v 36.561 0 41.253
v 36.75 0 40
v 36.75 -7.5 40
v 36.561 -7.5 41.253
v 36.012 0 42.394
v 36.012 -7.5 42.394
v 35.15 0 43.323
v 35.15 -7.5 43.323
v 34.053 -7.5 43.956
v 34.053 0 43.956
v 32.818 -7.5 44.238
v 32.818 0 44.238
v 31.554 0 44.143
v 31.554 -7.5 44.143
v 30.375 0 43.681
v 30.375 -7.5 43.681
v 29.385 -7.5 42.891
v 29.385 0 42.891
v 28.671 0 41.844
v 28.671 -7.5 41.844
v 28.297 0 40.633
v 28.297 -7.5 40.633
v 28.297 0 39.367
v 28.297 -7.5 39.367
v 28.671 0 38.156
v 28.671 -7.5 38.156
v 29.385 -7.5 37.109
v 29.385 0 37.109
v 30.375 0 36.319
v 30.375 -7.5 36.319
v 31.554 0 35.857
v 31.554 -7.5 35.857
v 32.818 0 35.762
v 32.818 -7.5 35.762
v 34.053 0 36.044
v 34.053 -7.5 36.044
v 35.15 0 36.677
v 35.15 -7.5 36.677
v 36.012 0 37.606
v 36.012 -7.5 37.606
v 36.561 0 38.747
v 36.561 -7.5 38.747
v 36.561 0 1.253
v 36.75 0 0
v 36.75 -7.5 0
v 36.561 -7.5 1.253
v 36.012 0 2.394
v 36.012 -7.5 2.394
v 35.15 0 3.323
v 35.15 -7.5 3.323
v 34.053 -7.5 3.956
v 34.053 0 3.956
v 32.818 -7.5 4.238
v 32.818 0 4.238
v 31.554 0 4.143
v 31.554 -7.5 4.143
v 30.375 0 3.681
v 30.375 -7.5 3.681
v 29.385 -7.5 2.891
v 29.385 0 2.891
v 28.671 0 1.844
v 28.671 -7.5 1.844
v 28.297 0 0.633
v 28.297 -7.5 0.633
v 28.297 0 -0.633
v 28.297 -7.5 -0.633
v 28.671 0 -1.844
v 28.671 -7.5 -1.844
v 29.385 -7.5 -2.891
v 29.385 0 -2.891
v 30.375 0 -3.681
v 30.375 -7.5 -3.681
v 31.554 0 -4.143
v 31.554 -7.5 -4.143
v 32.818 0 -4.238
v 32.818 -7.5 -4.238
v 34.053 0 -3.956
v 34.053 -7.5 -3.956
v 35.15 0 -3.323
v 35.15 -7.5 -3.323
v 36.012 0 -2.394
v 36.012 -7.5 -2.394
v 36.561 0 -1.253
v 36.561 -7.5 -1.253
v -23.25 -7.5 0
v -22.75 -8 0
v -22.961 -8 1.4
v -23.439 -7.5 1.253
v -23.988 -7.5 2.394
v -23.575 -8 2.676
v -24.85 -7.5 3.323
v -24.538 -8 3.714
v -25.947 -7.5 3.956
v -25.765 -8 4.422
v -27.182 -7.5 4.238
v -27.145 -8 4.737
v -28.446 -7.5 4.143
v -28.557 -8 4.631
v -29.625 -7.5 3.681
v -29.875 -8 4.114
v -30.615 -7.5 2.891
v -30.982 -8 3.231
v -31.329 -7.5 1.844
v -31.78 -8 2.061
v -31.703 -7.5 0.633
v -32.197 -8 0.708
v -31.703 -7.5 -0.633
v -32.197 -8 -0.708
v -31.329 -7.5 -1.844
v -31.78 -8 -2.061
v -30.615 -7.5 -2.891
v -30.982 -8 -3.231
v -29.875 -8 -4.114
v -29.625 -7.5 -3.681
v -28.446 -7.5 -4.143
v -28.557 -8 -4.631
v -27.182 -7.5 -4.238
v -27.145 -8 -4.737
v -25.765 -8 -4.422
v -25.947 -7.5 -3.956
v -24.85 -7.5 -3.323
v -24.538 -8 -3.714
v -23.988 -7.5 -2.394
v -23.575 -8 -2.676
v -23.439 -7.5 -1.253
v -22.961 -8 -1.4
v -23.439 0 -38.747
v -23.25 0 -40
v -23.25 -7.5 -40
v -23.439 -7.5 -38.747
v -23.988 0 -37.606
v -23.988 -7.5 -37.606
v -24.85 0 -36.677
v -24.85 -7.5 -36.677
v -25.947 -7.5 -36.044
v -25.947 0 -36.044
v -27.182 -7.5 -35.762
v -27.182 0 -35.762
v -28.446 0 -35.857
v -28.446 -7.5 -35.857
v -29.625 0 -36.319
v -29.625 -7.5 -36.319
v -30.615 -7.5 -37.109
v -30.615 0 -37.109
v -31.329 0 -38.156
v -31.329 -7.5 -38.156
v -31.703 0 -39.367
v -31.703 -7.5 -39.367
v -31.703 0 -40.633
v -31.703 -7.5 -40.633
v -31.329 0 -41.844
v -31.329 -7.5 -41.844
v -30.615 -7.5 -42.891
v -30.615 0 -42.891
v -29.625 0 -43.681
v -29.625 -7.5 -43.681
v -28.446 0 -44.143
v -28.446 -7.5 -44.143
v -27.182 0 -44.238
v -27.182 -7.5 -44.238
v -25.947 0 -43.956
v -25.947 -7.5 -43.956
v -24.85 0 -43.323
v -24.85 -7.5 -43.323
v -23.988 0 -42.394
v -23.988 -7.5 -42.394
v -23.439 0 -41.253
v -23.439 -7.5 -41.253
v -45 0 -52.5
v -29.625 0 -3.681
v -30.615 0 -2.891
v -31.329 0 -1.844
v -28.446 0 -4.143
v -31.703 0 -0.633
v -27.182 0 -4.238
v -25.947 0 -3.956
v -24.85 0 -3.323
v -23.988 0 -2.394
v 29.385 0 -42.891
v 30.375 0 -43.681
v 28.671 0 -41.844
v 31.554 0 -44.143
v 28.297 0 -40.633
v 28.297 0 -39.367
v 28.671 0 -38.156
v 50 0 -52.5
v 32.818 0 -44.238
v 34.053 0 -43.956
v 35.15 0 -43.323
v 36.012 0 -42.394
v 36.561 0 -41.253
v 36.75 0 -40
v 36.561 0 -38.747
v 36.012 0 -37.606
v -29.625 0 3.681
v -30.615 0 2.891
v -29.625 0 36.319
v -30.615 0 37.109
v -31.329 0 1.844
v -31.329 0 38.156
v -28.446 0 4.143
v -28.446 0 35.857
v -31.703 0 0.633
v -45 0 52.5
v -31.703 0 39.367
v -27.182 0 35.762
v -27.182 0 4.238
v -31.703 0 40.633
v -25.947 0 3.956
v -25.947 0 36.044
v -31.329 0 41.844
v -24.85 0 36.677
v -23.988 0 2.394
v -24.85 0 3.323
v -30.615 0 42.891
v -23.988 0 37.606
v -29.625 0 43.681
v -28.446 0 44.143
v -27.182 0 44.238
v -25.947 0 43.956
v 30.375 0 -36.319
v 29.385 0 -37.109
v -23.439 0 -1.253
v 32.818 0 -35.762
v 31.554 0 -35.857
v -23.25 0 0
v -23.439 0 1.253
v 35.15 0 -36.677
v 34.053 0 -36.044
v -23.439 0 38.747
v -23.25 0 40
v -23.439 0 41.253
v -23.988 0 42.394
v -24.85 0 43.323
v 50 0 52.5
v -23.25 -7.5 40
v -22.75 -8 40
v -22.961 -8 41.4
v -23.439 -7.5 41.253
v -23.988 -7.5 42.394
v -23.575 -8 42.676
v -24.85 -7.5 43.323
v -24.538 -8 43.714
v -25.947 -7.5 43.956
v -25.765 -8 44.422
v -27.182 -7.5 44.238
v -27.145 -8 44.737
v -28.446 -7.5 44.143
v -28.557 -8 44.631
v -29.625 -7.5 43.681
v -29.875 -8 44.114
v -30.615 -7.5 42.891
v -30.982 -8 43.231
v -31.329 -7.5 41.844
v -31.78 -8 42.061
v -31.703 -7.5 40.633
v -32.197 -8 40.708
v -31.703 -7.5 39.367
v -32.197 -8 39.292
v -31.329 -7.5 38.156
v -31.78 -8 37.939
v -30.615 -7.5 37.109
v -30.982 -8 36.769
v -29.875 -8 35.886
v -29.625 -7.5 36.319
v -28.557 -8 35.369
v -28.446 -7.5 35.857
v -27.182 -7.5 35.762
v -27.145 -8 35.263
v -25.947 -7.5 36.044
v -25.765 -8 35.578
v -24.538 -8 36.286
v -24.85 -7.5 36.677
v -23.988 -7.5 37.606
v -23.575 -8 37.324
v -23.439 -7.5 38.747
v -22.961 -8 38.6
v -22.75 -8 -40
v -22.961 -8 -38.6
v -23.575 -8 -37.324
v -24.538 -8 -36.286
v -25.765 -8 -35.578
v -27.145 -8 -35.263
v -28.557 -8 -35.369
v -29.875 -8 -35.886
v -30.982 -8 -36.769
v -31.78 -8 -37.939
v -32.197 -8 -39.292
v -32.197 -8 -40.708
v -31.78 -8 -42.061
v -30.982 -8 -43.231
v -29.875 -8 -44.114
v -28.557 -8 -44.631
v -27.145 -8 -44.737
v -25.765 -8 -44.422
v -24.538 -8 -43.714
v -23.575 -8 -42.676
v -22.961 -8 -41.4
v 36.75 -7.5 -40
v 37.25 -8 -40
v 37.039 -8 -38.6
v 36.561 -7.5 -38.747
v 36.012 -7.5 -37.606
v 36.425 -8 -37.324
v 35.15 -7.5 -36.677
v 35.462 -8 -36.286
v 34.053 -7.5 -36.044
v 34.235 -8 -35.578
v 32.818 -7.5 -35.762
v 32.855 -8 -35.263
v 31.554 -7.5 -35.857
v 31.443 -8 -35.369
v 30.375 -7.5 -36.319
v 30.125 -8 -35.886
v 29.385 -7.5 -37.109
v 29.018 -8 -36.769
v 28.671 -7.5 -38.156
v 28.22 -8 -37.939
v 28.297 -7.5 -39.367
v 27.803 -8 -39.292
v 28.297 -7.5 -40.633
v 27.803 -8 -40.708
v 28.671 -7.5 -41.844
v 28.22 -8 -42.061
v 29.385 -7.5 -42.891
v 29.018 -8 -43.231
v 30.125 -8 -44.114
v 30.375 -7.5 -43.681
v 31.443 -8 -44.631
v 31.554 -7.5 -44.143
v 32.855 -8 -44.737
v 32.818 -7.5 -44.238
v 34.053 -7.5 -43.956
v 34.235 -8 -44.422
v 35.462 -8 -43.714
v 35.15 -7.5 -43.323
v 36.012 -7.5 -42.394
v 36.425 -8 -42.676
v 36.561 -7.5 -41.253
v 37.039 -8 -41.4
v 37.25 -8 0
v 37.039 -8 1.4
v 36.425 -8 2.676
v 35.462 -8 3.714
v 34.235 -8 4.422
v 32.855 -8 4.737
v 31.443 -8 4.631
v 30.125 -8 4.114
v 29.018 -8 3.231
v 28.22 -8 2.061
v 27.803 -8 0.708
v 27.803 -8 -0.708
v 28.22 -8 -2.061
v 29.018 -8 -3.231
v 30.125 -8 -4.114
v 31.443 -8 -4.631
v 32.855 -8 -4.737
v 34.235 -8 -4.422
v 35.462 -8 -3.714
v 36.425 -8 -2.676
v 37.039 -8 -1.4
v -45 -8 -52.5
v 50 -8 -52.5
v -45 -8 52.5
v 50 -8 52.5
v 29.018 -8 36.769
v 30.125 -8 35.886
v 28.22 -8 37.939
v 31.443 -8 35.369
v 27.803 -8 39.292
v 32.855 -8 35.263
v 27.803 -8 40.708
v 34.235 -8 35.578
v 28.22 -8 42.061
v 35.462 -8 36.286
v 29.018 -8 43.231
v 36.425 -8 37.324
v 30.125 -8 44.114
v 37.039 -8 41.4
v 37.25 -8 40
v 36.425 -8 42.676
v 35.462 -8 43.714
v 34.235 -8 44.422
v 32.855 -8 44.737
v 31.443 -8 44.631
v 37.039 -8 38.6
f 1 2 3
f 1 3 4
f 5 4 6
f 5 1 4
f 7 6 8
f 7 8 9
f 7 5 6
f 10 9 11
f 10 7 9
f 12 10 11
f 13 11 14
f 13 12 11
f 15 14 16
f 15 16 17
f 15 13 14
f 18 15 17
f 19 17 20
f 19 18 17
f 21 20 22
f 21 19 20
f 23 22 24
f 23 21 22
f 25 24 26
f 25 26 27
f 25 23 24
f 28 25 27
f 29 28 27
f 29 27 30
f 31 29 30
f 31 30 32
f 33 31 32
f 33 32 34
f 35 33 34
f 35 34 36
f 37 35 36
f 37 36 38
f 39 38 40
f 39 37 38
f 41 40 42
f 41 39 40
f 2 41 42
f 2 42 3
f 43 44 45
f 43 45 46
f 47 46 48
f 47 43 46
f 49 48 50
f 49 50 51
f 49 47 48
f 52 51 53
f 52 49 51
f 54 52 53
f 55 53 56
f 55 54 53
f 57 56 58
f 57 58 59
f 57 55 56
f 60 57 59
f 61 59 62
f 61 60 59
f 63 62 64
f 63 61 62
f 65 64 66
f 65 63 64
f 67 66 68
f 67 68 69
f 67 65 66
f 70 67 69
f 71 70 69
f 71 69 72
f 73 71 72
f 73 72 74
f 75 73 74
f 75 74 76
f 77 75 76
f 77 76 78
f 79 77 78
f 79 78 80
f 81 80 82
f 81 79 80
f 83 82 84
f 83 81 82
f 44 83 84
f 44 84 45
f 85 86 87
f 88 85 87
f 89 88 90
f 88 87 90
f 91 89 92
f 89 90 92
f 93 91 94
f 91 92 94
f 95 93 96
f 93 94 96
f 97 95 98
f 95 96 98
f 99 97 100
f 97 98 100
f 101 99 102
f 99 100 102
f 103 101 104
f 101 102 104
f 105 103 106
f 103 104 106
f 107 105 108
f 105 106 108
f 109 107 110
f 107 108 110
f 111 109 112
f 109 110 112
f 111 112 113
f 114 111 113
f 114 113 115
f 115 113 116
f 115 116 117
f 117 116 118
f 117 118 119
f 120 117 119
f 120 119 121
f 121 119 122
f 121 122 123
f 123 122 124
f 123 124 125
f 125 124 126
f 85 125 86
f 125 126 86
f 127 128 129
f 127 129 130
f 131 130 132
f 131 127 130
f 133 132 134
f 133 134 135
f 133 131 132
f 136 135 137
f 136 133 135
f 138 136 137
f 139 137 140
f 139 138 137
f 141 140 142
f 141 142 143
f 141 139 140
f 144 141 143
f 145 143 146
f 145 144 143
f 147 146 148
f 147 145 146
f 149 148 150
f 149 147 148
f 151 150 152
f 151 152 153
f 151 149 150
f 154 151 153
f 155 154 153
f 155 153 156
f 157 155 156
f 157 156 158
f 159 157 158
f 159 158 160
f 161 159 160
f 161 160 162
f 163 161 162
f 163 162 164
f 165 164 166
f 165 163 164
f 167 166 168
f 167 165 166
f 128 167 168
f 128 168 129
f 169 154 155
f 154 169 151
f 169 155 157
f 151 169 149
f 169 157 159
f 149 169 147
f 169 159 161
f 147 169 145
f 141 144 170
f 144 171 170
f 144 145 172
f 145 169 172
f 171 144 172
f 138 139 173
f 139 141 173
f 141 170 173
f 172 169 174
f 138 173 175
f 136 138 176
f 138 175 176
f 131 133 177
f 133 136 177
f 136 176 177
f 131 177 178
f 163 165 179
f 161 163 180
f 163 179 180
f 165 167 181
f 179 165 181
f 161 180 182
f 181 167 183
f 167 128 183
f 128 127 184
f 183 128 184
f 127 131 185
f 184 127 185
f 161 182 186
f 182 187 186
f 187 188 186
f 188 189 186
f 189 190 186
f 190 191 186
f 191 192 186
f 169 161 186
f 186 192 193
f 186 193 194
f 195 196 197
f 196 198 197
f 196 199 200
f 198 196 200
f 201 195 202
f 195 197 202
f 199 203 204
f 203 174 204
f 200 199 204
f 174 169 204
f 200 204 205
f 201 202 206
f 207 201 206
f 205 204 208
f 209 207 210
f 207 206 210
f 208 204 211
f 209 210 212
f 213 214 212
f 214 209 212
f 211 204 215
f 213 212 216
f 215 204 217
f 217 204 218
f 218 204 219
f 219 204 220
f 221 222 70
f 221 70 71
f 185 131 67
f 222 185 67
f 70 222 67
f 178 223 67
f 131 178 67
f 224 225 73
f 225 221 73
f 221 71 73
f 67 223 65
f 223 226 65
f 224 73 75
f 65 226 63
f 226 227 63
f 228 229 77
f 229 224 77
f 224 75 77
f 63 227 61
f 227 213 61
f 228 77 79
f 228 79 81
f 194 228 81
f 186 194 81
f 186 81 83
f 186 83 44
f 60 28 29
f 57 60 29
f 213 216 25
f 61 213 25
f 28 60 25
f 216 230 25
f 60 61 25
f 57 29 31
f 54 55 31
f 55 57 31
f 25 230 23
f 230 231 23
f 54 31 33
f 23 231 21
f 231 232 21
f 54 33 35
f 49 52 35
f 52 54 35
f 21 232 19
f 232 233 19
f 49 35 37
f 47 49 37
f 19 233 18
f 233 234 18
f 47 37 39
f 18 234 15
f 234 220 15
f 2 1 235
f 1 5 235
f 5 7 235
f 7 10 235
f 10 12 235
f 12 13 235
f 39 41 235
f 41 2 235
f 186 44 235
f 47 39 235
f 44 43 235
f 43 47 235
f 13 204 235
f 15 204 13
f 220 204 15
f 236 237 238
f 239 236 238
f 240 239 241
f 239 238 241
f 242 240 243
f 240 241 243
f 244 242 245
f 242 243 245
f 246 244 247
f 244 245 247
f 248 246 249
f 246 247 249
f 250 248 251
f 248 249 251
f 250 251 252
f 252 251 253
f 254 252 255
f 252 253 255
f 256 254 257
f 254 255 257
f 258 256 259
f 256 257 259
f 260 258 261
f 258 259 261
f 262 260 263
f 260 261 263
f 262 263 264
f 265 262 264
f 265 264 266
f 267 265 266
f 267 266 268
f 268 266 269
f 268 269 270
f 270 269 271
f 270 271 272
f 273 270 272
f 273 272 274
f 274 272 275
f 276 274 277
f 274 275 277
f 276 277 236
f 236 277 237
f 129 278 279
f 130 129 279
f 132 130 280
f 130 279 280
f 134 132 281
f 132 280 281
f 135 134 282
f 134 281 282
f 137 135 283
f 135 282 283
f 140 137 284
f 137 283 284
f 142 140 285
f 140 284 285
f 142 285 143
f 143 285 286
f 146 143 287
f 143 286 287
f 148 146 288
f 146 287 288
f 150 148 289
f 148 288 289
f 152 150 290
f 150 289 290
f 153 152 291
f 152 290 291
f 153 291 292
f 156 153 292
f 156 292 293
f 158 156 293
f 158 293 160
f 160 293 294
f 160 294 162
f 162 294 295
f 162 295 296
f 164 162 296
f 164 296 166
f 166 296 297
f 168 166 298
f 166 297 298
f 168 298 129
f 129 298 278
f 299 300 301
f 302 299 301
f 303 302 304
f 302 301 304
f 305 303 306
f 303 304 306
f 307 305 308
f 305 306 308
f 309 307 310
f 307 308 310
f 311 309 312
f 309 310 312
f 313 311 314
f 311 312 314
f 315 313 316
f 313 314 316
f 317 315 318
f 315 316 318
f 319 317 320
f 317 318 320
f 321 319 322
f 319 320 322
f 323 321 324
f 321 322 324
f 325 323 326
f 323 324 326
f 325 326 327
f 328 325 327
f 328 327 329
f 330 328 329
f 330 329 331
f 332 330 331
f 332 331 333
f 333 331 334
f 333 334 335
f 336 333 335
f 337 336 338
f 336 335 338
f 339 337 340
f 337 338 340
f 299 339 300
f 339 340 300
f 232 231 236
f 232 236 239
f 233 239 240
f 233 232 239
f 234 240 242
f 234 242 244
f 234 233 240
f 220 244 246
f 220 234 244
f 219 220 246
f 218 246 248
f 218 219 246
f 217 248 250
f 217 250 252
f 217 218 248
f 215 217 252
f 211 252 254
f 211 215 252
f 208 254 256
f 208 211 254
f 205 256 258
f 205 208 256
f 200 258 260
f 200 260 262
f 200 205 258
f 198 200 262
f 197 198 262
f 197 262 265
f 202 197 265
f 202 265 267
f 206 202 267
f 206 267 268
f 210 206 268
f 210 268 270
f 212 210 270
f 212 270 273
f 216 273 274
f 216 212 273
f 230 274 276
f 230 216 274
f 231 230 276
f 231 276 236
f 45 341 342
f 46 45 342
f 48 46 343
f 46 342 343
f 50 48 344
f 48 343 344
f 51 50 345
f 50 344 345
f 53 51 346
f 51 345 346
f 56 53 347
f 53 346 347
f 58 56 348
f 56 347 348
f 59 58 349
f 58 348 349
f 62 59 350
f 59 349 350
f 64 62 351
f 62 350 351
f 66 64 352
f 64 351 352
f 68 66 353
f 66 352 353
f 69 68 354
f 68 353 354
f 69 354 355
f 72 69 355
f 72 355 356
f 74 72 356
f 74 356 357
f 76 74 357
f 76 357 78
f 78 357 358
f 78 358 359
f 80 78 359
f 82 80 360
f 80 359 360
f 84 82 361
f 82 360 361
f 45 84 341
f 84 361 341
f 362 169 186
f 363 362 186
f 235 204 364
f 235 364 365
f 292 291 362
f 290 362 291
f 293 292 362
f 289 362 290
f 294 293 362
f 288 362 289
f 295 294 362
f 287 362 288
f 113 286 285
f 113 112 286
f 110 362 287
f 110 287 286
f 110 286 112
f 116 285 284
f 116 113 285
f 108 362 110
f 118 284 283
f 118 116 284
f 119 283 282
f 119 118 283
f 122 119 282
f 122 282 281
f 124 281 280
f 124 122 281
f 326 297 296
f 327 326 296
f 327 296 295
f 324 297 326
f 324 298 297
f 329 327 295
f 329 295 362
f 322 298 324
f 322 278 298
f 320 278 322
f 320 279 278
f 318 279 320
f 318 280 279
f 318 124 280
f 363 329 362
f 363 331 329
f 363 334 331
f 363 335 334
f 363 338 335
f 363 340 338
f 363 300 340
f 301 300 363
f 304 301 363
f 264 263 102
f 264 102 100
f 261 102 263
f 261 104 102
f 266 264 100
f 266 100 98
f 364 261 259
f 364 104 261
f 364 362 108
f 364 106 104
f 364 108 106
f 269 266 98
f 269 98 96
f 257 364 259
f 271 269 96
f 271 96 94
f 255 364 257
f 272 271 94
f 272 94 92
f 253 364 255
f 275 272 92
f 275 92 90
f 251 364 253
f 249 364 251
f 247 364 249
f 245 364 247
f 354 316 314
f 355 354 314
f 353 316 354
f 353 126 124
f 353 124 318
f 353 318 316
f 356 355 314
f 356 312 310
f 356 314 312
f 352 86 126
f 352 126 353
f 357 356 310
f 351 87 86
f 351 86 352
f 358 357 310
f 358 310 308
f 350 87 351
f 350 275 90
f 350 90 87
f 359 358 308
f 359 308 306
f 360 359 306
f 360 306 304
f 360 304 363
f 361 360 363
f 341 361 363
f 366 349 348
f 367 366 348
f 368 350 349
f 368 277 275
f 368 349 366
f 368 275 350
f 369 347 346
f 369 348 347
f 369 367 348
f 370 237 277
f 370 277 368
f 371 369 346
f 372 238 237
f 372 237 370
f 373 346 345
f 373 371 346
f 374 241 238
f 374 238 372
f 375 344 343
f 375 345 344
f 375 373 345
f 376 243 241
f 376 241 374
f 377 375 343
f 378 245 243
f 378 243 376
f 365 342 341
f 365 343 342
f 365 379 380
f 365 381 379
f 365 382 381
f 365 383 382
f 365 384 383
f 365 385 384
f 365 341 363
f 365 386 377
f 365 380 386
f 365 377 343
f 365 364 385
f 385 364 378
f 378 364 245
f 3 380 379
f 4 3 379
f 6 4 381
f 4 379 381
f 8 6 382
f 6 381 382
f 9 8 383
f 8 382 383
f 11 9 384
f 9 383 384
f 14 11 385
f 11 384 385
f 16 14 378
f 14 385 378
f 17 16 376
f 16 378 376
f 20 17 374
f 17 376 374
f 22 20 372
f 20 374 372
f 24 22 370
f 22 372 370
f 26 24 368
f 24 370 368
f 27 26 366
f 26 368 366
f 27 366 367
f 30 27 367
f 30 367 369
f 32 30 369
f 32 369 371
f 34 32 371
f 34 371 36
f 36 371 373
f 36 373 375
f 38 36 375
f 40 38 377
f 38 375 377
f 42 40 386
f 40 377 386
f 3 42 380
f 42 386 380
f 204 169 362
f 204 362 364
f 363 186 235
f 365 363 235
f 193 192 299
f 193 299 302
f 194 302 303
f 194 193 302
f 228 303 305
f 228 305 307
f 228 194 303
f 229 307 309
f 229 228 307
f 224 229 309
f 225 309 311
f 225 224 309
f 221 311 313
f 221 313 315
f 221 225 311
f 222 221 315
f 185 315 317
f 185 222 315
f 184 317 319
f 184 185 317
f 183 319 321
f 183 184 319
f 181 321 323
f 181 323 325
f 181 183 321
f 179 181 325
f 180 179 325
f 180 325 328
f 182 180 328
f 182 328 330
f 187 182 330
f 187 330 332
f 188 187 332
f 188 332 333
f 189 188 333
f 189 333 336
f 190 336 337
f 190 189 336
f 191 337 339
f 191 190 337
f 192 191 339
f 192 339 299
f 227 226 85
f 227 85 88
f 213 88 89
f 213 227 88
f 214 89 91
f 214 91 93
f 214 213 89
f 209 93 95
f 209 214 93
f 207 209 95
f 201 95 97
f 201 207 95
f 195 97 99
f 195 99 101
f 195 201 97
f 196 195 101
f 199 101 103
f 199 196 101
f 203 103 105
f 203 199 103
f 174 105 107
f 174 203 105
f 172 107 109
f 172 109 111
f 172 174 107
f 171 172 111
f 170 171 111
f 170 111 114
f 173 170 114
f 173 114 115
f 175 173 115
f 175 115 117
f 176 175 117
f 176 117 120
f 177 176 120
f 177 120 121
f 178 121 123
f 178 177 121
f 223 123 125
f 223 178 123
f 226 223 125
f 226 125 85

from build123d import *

# Parameters (mm, degrees)
F0_W     = 95
F0_H     = 105
F0_R     = 4.25
F1_DEPTH = 8
F2_SIZE  = 0.5


with BuildPart() as f1:
    # F0 (on Front) → F1 (new body)
    with BuildSketch(Plane.XZ):
        with Locations((2.5, 0)):
            Rectangle(F0_W, F0_H)
        with Locations((-27.5, -40)):
            Circle(F0_R, mode=Mode.SUBTRACT)
        with Locations((32.5, -40)):
            Circle(F0_R, mode=Mode.SUBTRACT)
        with Locations((-27.5, 0)):
            Circle(F0_R, mode=Mode.SUBTRACT)
        with Locations((-27.5, 40)):
            Circle(F0_R, mode=Mode.SUBTRACT)
        with Locations((32.5, 0)):
            Circle(F0_R, mode=Mode.SUBTRACT)
        with Locations((32.5, 40)):
            Circle(F0_R, mode=Mode.SUBTRACT)
    extrude(amount=F1_DEPTH)

    # F2
    f2_edges = [f1.edges().sort_by_distance(p)[0] for p in [
        (-31.75, -8, 40),
        (28.25, -8, 40),
        (28.25, -8, -40),
        (-31.75, -8, -40),
        (-31.75, -8, 0),
        (28.25, -8, 0),
    ]]
    chamfer(f2_edges, length=F2_SIZE)


solid = f1.part
